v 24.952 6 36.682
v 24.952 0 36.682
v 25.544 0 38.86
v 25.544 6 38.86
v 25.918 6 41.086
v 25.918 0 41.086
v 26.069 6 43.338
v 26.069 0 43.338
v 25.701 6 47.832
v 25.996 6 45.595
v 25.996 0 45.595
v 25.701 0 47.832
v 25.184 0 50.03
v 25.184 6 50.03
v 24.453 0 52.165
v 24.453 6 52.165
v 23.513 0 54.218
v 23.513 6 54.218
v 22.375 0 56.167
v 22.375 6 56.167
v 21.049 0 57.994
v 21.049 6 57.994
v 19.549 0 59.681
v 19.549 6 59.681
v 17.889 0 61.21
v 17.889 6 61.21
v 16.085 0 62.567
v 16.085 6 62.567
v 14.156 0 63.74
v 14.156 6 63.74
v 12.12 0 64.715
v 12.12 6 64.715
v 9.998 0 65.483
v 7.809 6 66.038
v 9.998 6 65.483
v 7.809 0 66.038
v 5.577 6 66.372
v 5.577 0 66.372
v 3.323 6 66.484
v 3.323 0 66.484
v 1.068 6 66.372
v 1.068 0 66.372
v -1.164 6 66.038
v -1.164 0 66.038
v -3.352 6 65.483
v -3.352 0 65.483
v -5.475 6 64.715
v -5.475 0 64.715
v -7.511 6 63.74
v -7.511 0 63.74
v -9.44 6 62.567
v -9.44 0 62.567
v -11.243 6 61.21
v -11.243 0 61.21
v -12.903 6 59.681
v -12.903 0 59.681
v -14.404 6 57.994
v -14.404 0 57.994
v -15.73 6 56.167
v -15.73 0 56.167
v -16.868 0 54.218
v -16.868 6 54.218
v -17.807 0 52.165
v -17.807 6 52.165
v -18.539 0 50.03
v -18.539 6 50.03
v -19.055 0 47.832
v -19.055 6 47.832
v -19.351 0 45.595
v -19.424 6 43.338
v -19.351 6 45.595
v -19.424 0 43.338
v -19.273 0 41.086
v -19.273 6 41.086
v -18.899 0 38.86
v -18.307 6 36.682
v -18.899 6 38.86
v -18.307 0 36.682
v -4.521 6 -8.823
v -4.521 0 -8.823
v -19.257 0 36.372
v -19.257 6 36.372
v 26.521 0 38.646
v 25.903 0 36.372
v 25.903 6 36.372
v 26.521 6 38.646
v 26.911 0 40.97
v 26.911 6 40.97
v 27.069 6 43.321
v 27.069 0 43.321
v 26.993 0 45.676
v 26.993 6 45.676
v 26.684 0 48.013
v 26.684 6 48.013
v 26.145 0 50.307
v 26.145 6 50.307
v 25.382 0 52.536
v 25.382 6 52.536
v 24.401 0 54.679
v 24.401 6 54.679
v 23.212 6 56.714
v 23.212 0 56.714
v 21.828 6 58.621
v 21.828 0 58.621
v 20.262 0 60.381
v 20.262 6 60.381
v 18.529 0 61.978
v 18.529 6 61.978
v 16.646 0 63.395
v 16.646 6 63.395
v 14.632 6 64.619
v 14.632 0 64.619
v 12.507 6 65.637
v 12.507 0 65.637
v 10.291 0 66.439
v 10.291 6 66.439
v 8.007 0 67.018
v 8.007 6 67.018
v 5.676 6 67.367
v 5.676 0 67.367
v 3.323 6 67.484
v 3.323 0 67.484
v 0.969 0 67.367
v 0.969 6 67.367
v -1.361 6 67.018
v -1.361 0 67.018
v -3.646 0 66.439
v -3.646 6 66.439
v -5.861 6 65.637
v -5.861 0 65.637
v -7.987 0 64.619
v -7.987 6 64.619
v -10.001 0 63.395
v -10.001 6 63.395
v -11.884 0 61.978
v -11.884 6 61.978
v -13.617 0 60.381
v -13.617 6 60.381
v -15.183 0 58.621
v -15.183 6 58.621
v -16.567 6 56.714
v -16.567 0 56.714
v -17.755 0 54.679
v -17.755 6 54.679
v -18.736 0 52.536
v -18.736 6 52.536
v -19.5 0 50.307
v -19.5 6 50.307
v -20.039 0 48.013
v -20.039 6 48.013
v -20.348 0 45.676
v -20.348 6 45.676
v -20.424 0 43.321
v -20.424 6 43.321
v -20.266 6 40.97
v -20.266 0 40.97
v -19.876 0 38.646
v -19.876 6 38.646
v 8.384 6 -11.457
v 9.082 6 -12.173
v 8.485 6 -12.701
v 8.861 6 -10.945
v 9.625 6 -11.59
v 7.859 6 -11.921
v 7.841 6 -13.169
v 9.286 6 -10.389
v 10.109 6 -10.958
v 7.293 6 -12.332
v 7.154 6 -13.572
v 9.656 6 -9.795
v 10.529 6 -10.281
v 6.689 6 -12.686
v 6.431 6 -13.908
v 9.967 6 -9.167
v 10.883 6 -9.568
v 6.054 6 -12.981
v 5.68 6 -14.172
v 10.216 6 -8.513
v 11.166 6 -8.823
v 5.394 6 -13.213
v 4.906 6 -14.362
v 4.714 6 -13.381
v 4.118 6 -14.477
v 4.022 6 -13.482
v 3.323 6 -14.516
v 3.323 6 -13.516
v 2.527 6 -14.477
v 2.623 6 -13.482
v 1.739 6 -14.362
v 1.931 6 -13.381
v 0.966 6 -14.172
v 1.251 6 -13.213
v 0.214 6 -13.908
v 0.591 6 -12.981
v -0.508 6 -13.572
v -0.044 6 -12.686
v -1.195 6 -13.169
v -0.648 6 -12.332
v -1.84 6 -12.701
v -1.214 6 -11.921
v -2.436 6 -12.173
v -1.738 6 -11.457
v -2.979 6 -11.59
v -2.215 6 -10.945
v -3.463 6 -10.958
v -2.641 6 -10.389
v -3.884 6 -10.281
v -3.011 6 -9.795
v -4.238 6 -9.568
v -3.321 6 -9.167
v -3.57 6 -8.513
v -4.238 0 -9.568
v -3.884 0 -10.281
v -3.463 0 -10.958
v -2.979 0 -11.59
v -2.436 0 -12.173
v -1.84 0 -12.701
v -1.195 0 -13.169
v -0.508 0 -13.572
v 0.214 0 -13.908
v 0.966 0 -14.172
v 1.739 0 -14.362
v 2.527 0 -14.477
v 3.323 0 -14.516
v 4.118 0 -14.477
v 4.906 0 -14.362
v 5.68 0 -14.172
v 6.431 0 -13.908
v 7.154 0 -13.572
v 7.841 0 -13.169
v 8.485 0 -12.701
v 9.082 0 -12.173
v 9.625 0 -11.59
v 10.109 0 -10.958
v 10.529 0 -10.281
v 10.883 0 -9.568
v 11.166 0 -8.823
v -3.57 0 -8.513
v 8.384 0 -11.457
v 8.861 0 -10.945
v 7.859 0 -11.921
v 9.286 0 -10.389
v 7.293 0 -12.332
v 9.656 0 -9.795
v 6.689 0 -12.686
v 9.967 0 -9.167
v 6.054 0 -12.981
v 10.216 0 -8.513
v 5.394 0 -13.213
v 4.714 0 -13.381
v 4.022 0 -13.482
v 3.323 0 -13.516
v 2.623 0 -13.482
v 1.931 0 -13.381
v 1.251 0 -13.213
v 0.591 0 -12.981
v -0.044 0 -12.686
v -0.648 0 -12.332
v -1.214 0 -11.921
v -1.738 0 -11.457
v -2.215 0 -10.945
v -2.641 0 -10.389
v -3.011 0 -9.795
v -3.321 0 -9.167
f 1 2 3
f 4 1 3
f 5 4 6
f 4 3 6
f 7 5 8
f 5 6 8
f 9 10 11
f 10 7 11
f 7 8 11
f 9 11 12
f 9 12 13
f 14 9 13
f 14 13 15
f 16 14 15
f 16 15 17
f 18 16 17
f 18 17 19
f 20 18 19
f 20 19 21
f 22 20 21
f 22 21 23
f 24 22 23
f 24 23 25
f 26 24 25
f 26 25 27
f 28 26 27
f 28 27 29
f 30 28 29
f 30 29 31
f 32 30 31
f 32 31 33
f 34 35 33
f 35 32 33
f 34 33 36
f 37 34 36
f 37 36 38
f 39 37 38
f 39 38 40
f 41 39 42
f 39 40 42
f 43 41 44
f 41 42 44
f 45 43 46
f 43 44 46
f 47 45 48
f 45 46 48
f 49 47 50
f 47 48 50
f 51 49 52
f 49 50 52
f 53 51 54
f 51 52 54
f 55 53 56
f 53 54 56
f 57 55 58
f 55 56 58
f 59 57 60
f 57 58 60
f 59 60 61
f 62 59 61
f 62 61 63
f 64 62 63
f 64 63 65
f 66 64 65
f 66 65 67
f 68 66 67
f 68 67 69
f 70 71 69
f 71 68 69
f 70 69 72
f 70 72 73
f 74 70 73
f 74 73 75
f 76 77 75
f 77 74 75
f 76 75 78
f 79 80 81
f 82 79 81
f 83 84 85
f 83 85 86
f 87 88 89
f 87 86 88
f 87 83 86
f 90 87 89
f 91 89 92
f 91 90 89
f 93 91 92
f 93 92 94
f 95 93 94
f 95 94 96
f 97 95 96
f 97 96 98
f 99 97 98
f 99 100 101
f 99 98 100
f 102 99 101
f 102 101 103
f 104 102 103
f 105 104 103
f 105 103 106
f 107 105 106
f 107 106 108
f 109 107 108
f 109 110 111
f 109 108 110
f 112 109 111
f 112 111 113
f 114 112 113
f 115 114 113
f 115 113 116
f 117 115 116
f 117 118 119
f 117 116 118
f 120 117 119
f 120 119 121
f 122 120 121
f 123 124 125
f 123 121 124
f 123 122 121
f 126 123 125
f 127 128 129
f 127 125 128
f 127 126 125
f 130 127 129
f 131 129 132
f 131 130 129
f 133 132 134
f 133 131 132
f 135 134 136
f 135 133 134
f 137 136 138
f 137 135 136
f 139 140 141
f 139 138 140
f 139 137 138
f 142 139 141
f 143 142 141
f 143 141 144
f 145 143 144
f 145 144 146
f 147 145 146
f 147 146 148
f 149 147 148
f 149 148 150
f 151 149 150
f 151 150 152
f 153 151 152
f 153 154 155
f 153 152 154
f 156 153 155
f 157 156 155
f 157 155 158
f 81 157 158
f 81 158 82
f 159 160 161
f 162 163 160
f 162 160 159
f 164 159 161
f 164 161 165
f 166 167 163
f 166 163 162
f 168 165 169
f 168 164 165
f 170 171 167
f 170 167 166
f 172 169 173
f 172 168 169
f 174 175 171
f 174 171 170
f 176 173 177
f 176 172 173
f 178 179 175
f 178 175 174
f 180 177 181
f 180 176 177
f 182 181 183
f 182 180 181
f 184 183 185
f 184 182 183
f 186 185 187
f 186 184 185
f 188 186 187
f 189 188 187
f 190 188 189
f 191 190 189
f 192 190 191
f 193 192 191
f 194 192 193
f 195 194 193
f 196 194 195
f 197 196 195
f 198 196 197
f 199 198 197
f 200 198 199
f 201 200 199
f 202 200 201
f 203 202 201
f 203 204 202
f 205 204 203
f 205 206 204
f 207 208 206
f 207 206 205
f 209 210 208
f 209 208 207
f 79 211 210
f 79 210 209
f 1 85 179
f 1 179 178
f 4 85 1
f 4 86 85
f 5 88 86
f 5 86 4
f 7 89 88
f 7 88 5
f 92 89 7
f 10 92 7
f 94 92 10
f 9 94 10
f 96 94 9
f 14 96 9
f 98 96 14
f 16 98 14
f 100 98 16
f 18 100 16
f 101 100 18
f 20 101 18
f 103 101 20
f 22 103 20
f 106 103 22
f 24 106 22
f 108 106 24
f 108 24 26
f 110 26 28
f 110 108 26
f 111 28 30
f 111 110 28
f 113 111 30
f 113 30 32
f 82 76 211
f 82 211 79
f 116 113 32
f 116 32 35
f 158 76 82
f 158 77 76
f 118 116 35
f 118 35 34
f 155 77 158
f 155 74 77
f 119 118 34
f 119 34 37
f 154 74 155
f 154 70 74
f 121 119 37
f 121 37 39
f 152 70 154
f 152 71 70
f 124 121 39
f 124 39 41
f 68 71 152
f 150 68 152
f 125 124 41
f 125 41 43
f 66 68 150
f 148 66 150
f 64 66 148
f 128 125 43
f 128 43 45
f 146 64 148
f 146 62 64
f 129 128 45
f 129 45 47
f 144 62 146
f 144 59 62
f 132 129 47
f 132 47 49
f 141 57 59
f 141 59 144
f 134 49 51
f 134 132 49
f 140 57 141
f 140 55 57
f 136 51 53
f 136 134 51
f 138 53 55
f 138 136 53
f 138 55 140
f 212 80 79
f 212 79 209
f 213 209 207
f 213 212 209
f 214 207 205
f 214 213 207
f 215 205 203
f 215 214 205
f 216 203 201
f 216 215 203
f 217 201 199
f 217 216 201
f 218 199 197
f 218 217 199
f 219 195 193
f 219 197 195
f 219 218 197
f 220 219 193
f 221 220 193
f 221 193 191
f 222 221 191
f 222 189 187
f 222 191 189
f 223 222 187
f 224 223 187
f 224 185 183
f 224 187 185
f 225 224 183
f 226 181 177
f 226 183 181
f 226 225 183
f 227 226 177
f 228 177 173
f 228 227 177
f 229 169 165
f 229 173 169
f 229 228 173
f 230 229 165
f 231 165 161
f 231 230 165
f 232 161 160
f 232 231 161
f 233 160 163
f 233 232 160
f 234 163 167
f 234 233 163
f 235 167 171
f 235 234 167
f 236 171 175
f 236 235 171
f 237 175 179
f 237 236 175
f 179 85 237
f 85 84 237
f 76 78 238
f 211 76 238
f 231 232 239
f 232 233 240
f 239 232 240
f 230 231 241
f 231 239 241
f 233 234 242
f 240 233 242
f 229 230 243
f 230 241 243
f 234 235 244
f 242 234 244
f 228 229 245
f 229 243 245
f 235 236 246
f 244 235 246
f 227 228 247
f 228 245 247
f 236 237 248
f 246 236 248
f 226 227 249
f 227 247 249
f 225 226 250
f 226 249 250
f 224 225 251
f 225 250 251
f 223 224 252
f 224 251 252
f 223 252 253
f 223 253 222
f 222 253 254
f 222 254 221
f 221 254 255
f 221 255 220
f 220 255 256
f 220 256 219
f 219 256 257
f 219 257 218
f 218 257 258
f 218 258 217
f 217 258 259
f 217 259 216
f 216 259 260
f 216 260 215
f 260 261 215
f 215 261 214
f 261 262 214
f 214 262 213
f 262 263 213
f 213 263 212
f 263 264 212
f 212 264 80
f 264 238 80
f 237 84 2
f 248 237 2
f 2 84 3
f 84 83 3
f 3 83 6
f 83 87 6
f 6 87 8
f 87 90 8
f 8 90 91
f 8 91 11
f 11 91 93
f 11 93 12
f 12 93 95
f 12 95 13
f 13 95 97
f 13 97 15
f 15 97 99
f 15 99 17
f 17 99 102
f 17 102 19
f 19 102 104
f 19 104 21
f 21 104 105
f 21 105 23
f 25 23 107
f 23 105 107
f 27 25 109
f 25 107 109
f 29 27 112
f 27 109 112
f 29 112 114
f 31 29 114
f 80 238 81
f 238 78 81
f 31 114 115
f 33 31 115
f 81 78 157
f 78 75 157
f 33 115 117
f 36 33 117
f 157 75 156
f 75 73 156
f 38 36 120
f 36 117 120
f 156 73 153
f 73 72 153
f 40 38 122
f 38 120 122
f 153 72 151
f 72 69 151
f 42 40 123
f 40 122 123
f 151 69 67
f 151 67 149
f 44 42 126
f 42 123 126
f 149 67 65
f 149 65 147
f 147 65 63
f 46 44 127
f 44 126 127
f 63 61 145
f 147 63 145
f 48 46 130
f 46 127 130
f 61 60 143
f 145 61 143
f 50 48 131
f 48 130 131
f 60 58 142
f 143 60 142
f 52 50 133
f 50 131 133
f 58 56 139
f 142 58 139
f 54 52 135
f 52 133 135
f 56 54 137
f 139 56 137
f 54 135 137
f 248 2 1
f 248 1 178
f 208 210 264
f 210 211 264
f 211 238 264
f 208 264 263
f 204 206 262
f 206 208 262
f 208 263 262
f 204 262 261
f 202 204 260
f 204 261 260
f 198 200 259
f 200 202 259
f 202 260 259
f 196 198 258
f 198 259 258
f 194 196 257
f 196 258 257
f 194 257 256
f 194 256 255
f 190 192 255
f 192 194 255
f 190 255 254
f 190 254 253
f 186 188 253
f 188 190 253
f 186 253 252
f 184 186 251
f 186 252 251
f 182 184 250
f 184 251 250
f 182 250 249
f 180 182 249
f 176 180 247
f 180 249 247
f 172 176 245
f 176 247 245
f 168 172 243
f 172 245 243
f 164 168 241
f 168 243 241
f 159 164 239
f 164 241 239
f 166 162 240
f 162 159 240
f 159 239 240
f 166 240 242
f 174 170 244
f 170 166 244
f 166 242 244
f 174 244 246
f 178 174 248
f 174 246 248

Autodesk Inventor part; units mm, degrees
ref_plane "YZ Plane" through (0, 0, 0) normal (1, 0, 0) x (0, 1, 0)
ref_plane "XZ Plane" through (0, 0, 0) normal (0, 1, 0) x (-1, 0, 0)
ref_plane "XY Plane" through (0, 0, 0) normal (0, 0, 1) x (1, 0, 0)
sketch "Sketch1" plane through (0, 0, 0) normal (0, 1, 0) x (-1, 0, 0)
  arc A0 (18.3066, 36.6819) -> (-24.9519, 36.6819) centre (-3.3227, 43.7344) ccw
  arc A1 (-10.2155, -8.5131) -> (3.5702, -8.5131) centre (-3.3227, -6.2656) ccw
  line L0 (-24.9519, 36.6819) -> (-10.2155, -8.5131)
  line L1 (18.3066, 36.6819) -> (3.5702, -8.5131)
  line L2 (-25.9027, 36.3719) -> (-11.1663, -8.8231)
  arc A2 (-11.1663, -8.8231) -> (4.5209, -8.8231) centre (-3.3227, -6.2656) ccw
  line L3 (4.5209, -8.8231) -> (19.2573, 36.3719)
  arc A3 (19.2573, 36.3719) -> (-25.9027, 36.3719) centre (-3.3227, 43.7344) ccw
  point P0 (0, 0)
  dimension "d0" = 45.5
  dimension "d1" = 14.5
  dimension "d2" = 50
  dimension "d3" = 1
extrude "Extrusion1" add sketch "Sketch1" along normal blind 6
properties part number "COTS_Optibelt_Omega_HTD3M_204T_6mm"
